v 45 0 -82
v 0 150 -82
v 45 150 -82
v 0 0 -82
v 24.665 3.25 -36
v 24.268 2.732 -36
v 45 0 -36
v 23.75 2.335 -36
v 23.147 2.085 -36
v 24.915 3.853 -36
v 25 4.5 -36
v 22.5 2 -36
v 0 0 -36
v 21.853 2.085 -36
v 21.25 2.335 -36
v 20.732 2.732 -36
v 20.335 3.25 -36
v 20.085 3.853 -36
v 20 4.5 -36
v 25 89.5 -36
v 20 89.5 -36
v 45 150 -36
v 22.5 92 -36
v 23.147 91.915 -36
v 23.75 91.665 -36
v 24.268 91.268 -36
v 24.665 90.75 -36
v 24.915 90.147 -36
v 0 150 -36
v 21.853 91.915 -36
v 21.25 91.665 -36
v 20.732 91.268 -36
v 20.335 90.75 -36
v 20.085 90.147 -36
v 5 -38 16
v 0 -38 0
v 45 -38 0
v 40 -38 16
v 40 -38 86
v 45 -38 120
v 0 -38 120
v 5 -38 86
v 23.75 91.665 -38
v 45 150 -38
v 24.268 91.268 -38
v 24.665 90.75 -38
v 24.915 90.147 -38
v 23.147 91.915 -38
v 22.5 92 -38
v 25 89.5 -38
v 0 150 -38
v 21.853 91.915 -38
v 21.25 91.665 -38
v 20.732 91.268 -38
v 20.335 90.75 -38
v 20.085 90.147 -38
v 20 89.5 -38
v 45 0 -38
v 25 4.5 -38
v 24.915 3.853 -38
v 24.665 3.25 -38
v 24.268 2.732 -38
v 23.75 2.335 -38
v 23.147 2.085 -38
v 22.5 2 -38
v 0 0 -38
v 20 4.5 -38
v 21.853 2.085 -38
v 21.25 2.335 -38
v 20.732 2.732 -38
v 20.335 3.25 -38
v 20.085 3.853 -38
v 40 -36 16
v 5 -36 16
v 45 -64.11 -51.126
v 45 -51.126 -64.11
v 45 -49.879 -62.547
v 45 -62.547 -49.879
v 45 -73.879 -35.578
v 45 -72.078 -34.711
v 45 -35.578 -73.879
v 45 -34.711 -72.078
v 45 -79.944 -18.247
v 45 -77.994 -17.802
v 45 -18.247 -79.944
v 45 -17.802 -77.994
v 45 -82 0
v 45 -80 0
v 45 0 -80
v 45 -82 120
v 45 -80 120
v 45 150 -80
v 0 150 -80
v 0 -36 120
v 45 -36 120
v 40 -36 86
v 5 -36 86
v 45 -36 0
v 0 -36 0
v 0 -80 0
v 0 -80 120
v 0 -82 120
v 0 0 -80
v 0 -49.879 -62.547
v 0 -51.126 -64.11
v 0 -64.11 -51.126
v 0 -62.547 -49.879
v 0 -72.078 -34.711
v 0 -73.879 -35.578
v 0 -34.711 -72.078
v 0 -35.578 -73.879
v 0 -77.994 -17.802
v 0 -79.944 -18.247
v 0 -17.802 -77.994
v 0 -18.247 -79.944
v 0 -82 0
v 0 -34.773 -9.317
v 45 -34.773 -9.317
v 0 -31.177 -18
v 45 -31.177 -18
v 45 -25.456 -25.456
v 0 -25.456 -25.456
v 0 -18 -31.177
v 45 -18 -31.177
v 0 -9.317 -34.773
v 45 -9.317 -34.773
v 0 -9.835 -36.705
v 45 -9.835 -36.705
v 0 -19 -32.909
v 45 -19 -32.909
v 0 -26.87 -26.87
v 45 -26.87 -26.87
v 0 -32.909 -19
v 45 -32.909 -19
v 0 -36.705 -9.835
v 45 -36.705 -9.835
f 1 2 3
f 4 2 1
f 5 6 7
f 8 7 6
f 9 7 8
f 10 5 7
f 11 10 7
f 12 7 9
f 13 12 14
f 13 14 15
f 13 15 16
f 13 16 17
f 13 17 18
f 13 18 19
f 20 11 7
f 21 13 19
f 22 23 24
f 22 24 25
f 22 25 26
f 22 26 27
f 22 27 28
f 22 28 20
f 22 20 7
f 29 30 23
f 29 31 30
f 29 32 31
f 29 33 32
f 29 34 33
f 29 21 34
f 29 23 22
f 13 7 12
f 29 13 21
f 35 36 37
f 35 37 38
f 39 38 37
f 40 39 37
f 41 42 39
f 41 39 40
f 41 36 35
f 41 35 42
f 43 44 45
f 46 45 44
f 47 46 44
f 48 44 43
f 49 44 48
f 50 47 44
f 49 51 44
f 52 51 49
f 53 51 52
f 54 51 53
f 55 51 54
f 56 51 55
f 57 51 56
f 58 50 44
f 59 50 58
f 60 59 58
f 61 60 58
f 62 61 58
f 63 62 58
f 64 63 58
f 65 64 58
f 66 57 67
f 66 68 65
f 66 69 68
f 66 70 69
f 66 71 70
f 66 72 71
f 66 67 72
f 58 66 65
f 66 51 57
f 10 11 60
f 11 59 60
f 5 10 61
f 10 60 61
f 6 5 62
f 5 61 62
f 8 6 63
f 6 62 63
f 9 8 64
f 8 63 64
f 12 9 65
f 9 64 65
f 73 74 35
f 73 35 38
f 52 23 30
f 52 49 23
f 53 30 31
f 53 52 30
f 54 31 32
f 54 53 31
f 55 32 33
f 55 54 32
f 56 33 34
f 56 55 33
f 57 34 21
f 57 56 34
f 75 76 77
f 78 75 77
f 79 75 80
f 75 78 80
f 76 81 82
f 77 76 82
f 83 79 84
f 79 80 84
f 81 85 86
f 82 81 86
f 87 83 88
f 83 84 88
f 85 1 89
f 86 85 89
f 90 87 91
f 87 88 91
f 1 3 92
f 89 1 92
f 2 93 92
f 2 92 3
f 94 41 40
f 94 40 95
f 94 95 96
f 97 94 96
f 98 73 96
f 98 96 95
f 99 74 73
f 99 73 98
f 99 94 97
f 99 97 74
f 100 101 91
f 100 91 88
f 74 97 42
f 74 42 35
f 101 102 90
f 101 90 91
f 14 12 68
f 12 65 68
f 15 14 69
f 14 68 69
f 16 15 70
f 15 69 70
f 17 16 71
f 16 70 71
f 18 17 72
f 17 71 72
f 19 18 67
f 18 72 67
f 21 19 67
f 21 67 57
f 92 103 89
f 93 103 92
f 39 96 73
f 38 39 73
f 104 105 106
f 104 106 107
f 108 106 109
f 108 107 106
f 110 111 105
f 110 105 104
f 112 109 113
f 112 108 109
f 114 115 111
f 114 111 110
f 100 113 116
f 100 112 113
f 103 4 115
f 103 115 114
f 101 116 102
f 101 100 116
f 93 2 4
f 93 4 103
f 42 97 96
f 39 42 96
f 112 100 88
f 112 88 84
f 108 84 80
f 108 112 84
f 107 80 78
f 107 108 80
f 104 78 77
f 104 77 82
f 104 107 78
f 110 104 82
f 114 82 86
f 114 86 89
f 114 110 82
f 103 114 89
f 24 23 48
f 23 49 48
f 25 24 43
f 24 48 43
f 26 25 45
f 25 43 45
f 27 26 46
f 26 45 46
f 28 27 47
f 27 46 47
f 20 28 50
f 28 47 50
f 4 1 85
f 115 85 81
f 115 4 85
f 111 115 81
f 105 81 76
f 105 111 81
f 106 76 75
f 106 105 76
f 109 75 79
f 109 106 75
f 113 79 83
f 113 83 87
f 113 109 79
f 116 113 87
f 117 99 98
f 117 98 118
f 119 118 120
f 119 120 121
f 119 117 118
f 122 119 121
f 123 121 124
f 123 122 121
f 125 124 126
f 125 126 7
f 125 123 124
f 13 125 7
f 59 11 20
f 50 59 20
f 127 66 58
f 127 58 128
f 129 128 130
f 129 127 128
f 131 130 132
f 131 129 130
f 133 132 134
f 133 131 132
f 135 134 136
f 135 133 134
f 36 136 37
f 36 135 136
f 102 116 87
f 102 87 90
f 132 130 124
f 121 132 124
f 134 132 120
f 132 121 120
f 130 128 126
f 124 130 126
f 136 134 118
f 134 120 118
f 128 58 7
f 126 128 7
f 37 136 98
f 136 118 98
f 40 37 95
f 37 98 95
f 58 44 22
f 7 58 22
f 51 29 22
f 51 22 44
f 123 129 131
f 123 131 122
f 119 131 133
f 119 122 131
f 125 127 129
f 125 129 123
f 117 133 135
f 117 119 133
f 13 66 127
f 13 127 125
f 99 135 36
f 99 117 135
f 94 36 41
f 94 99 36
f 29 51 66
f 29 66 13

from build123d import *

# Parameters (mm, degrees)
BOSS_EXTRUDE1_DEPTH   = 45
BOSS_EXTRUDE1_2_DEPTH = 45
SKETCH2_W             = 5
SKETCH2_H             = 90
CUT_EXTRUDE1_DEPTH    = 5
SKETCH3_W             = 35
SKETCH3_H             = 70
CUT_EXTRUDE2_DEPTH    = 5
FILLET1_R             = 2.5


with BuildPart() as part:
    # Sketch1 → Boss-Extrude1 (new body)
    with BuildSketch(Plane(origin=(0, 0, 0), x_dir=(0, 0, -1), z_dir=(1, 0, 0))):
        with BuildLine():
            Line((0, -38), (-120, -38))
            Line((-120, -38), (-120, -36))
            Line((-120, -36), (0, -36))
            ThreePointArc((0, -36), (25.455844123, -25.455844123), (36, 0))
            Line((36, 0), (36, 150))
            Line((36, 150), (38, 150))
            Line((38, 150), (38, 0))
            ThreePointArc((38, 0), (26.870057685, -26.870057685), (0, -38))
        make_face()
    extrude(amount=BOSS_EXTRUDE1_DEPTH)

    # Sketch2 → Cut-Extrude1 (cut)
    with BuildSketch(Plane.XY.offset(-36)):
        with Locations((22.5, 47)):
            Rectangle(SKETCH2_W, SKETCH2_H)
    extrude(amount=-CUT_EXTRUDE1_DEPTH, mode=Mode.SUBTRACT)

    # Sketch3 → Cut-Extrude2 (cut)
    with BuildSketch(Plane(origin=(0, -36, 0), x_dir=(1, 0, 0), z_dir=(0, 1, 0))):
        with Locations((22.5, -51)):
            Rectangle(SKETCH3_W, SKETCH3_H)
    extrude(amount=-CUT_EXTRUDE2_DEPTH, mode=Mode.SUBTRACT)

    # Fillet1
    fillet1_edges = [part.edges().sort_by_distance(p)[0] for p in [
        (25, 92, -37),
        (20, 92, -37),
        (25, 2, -37),
        (20, 2, -37),
    ]]
    fillet(fillet1_edges, radius=FILLET1_R - 0.0001)  # a hair under: the kernel refuses the full size


with BuildPart() as body_2:
    # Sketch1 → Boss-Extrude1 2 (new body)
    with BuildSketch(Plane(origin=(0, 0, 0), x_dir=(0, 0, -1), z_dir=(1, 0, 0))):
        with BuildLine():
            Line((-120, -80), (0, -80))
            ThreePointArc((0, -80), (56.568542495, -56.568542495), (80, 0))
            Line((80, 0), (80, 150))
            Line((80, 150), (82, 150))
            Line((82, 150), (82, 0))
            ThreePointArc((82, 0), (57.982756057, -57.982756057), (0, -82))
            Line((0, -82), (-120, -82))
            Line((-120, -82), (-120, -80))
        make_face()
    extrude(amount=BOSS_EXTRUDE1_2_DEPTH)


solid = Compound([part.part, body_2.part])
